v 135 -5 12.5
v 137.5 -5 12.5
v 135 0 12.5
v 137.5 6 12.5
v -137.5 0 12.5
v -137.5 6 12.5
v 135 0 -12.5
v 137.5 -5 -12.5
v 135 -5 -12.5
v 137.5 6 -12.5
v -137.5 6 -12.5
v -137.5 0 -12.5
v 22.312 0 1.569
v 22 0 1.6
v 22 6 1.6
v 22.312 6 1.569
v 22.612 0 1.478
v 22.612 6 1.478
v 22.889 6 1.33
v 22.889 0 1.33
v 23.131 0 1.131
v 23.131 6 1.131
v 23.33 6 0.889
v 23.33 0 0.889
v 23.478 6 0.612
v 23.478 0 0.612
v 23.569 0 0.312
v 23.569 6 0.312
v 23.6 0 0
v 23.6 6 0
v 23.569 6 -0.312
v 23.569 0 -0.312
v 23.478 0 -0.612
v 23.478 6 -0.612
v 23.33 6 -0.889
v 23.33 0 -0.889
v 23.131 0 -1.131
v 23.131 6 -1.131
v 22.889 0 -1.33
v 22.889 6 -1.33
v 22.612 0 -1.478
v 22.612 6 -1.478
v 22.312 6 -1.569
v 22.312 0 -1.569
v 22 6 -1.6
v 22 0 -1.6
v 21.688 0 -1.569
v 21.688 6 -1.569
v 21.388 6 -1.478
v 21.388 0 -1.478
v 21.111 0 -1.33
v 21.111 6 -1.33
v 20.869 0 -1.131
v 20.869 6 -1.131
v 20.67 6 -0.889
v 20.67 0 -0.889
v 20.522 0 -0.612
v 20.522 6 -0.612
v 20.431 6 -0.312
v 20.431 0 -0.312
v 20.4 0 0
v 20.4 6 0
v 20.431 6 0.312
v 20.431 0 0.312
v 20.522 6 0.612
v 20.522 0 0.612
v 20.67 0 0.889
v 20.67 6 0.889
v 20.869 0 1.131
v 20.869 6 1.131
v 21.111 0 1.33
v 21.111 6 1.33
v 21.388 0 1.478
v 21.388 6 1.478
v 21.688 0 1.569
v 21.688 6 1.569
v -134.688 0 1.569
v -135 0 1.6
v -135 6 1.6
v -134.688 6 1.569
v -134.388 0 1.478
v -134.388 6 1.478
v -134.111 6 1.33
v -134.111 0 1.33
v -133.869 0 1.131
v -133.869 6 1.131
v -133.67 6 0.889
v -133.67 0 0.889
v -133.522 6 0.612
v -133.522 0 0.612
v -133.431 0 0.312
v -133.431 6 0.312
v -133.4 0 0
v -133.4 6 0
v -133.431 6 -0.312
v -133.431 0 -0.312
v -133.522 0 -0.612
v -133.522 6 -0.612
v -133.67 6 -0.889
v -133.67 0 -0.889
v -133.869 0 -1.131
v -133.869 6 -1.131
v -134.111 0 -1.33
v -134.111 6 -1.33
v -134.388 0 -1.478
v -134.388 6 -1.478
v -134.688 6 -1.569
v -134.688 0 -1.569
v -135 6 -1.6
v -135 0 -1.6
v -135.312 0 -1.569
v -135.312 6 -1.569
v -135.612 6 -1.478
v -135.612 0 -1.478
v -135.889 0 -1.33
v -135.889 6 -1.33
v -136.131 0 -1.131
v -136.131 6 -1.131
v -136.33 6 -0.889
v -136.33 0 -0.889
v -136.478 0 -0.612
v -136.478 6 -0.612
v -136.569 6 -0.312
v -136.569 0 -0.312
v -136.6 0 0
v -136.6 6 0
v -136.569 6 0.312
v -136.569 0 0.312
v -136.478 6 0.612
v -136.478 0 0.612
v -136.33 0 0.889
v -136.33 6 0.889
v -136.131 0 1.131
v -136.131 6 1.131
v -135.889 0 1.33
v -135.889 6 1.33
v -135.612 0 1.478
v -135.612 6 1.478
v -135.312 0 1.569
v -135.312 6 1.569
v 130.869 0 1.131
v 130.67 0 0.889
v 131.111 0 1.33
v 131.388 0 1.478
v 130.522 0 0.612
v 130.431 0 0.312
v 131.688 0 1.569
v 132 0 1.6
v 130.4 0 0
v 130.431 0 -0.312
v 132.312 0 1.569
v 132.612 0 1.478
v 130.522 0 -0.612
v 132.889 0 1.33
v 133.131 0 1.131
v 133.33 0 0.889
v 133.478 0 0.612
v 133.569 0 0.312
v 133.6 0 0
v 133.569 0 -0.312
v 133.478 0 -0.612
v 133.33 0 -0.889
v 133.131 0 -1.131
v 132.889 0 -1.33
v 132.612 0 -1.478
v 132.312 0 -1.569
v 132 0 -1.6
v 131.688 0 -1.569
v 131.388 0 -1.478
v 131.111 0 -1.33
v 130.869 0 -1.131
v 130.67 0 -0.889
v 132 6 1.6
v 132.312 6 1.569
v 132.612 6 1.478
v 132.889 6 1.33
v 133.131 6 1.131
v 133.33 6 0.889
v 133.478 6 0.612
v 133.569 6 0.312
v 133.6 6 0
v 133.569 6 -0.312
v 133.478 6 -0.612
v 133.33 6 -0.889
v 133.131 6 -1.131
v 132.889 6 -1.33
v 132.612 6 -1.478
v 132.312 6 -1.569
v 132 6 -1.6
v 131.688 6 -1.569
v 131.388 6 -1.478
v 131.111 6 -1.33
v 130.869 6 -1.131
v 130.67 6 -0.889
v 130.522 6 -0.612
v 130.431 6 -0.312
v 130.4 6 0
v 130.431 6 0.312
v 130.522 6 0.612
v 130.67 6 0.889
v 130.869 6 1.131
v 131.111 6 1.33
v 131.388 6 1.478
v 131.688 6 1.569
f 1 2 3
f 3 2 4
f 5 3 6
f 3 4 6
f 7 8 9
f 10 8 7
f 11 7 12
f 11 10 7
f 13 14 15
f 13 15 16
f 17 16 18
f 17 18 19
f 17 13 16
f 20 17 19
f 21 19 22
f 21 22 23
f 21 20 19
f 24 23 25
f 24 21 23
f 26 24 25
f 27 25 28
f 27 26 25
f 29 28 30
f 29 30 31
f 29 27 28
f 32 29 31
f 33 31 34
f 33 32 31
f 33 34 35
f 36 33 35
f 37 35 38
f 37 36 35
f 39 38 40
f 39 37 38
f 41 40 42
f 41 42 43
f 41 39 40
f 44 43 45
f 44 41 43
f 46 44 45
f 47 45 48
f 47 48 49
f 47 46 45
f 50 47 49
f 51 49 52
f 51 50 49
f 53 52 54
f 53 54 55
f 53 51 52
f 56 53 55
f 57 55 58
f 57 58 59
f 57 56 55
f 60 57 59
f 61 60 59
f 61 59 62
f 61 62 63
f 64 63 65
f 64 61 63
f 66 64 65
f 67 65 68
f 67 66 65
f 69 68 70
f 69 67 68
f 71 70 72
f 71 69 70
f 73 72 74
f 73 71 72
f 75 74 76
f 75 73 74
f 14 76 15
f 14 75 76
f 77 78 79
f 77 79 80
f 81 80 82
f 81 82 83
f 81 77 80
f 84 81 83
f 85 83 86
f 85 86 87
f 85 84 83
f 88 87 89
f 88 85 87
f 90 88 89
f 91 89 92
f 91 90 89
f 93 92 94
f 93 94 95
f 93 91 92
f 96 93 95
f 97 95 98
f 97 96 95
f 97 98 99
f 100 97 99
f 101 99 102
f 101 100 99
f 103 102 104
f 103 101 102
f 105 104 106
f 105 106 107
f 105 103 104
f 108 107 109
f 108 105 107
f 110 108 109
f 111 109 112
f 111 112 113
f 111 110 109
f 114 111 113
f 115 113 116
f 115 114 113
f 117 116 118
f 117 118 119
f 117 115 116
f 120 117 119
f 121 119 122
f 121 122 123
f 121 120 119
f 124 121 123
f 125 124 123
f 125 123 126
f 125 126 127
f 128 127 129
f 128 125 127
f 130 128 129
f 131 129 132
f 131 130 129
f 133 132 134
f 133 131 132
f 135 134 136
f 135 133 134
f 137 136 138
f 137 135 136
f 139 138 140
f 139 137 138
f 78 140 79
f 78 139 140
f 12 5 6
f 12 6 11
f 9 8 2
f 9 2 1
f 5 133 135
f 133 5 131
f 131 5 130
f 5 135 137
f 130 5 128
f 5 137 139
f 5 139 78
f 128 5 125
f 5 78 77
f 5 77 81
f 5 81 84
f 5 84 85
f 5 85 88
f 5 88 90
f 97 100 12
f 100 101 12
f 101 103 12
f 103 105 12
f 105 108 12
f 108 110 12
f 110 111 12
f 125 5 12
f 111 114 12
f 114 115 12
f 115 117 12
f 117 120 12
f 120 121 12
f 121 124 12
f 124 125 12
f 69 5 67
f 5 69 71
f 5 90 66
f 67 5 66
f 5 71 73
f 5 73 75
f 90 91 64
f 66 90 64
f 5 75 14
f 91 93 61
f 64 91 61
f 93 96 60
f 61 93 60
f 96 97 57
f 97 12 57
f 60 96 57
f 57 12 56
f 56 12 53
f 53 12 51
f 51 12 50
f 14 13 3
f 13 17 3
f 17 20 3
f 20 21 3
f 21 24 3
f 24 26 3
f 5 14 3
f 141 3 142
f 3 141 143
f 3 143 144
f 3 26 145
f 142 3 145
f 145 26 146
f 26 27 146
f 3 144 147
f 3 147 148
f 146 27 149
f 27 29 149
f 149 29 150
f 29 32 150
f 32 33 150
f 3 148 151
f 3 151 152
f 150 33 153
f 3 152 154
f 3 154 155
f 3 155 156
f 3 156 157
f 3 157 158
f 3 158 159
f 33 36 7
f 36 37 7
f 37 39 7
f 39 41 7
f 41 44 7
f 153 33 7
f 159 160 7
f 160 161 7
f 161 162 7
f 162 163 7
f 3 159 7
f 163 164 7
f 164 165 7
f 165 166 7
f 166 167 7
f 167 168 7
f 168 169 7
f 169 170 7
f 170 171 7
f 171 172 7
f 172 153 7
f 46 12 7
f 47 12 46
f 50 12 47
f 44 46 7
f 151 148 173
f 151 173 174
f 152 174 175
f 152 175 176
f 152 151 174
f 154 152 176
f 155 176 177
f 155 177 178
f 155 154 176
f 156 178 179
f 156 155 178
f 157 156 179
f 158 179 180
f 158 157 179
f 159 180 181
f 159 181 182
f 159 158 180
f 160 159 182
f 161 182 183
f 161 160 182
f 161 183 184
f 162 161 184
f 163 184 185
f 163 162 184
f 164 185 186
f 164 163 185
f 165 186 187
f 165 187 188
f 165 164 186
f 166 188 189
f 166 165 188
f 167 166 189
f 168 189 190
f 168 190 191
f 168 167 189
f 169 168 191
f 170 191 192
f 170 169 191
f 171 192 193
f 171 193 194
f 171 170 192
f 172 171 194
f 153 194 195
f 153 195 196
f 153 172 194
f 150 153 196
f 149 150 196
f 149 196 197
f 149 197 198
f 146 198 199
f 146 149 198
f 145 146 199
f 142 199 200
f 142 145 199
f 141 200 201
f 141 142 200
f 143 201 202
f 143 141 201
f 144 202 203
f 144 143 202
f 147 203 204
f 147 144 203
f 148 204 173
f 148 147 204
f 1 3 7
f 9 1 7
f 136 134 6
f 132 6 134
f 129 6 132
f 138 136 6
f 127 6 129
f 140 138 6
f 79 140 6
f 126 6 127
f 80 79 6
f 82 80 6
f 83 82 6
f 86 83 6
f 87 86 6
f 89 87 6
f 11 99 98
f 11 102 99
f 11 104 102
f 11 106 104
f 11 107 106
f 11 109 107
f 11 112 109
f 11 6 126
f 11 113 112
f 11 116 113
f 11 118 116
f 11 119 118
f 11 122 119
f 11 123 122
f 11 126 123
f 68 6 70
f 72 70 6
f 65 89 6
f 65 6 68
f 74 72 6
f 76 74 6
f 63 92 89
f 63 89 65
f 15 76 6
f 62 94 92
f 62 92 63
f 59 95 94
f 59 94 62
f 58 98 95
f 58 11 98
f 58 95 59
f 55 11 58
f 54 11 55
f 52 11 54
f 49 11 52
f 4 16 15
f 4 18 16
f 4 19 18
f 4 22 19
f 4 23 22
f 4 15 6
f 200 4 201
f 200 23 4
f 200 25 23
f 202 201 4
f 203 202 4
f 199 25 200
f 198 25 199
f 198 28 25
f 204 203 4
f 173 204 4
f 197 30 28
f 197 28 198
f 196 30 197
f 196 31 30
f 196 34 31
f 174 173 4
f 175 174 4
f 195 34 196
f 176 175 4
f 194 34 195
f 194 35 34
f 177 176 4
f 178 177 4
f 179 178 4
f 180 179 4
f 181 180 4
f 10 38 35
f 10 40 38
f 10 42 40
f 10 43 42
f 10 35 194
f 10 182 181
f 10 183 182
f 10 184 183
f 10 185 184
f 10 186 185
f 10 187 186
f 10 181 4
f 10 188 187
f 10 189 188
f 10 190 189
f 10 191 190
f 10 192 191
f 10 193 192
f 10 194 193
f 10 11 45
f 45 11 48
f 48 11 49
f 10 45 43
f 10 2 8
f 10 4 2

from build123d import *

# Parameters (mm, degrees)
SKETCH1_W           = 275
SKETCH1_H           = 25
SKETCH1_R           = 1.6
BOSS_EXTRUDE1_DEPTH = 6
SKETCH2_W           = 2.5
SKETCH2_H           = 25
BOSS_EXTRUDE2_DEPTH = 5


with BuildPart() as part:
    # Sketch1 → Boss-Extrude1 (new body)
    with BuildSketch(Plane(origin=(0, 0, 0), x_dir=(1, 0, 0), z_dir=(0, 1, 0))):
        Rectangle(SKETCH1_W, SKETCH1_H)
        with Locations(Location((-135, 0, 0), (0, 0, 270))):
            Circle(SKETCH1_R, mode=Mode.SUBTRACT)
        with Locations(Location((132, 0, 0), (0, 0, 270))):
            Circle(SKETCH1_R, mode=Mode.SUBTRACT)
        with Locations(Location((22, 0, 0), (0, 0, 270))):
            Circle(SKETCH1_R, mode=Mode.SUBTRACT)
    extrude(amount=BOSS_EXTRUDE1_DEPTH)

    # Sketch2 → Boss-Extrude2 (add)
    with BuildSketch(Plane(origin=(0, 0, 0), x_dir=(-1, 0, 0), z_dir=(0, -1, 0))):
        with Locations((-136.25, 0)):
            Rectangle(SKETCH2_W, SKETCH2_H)
    extrude(amount=BOSS_EXTRUDE2_DEPTH)


solid = part.part
